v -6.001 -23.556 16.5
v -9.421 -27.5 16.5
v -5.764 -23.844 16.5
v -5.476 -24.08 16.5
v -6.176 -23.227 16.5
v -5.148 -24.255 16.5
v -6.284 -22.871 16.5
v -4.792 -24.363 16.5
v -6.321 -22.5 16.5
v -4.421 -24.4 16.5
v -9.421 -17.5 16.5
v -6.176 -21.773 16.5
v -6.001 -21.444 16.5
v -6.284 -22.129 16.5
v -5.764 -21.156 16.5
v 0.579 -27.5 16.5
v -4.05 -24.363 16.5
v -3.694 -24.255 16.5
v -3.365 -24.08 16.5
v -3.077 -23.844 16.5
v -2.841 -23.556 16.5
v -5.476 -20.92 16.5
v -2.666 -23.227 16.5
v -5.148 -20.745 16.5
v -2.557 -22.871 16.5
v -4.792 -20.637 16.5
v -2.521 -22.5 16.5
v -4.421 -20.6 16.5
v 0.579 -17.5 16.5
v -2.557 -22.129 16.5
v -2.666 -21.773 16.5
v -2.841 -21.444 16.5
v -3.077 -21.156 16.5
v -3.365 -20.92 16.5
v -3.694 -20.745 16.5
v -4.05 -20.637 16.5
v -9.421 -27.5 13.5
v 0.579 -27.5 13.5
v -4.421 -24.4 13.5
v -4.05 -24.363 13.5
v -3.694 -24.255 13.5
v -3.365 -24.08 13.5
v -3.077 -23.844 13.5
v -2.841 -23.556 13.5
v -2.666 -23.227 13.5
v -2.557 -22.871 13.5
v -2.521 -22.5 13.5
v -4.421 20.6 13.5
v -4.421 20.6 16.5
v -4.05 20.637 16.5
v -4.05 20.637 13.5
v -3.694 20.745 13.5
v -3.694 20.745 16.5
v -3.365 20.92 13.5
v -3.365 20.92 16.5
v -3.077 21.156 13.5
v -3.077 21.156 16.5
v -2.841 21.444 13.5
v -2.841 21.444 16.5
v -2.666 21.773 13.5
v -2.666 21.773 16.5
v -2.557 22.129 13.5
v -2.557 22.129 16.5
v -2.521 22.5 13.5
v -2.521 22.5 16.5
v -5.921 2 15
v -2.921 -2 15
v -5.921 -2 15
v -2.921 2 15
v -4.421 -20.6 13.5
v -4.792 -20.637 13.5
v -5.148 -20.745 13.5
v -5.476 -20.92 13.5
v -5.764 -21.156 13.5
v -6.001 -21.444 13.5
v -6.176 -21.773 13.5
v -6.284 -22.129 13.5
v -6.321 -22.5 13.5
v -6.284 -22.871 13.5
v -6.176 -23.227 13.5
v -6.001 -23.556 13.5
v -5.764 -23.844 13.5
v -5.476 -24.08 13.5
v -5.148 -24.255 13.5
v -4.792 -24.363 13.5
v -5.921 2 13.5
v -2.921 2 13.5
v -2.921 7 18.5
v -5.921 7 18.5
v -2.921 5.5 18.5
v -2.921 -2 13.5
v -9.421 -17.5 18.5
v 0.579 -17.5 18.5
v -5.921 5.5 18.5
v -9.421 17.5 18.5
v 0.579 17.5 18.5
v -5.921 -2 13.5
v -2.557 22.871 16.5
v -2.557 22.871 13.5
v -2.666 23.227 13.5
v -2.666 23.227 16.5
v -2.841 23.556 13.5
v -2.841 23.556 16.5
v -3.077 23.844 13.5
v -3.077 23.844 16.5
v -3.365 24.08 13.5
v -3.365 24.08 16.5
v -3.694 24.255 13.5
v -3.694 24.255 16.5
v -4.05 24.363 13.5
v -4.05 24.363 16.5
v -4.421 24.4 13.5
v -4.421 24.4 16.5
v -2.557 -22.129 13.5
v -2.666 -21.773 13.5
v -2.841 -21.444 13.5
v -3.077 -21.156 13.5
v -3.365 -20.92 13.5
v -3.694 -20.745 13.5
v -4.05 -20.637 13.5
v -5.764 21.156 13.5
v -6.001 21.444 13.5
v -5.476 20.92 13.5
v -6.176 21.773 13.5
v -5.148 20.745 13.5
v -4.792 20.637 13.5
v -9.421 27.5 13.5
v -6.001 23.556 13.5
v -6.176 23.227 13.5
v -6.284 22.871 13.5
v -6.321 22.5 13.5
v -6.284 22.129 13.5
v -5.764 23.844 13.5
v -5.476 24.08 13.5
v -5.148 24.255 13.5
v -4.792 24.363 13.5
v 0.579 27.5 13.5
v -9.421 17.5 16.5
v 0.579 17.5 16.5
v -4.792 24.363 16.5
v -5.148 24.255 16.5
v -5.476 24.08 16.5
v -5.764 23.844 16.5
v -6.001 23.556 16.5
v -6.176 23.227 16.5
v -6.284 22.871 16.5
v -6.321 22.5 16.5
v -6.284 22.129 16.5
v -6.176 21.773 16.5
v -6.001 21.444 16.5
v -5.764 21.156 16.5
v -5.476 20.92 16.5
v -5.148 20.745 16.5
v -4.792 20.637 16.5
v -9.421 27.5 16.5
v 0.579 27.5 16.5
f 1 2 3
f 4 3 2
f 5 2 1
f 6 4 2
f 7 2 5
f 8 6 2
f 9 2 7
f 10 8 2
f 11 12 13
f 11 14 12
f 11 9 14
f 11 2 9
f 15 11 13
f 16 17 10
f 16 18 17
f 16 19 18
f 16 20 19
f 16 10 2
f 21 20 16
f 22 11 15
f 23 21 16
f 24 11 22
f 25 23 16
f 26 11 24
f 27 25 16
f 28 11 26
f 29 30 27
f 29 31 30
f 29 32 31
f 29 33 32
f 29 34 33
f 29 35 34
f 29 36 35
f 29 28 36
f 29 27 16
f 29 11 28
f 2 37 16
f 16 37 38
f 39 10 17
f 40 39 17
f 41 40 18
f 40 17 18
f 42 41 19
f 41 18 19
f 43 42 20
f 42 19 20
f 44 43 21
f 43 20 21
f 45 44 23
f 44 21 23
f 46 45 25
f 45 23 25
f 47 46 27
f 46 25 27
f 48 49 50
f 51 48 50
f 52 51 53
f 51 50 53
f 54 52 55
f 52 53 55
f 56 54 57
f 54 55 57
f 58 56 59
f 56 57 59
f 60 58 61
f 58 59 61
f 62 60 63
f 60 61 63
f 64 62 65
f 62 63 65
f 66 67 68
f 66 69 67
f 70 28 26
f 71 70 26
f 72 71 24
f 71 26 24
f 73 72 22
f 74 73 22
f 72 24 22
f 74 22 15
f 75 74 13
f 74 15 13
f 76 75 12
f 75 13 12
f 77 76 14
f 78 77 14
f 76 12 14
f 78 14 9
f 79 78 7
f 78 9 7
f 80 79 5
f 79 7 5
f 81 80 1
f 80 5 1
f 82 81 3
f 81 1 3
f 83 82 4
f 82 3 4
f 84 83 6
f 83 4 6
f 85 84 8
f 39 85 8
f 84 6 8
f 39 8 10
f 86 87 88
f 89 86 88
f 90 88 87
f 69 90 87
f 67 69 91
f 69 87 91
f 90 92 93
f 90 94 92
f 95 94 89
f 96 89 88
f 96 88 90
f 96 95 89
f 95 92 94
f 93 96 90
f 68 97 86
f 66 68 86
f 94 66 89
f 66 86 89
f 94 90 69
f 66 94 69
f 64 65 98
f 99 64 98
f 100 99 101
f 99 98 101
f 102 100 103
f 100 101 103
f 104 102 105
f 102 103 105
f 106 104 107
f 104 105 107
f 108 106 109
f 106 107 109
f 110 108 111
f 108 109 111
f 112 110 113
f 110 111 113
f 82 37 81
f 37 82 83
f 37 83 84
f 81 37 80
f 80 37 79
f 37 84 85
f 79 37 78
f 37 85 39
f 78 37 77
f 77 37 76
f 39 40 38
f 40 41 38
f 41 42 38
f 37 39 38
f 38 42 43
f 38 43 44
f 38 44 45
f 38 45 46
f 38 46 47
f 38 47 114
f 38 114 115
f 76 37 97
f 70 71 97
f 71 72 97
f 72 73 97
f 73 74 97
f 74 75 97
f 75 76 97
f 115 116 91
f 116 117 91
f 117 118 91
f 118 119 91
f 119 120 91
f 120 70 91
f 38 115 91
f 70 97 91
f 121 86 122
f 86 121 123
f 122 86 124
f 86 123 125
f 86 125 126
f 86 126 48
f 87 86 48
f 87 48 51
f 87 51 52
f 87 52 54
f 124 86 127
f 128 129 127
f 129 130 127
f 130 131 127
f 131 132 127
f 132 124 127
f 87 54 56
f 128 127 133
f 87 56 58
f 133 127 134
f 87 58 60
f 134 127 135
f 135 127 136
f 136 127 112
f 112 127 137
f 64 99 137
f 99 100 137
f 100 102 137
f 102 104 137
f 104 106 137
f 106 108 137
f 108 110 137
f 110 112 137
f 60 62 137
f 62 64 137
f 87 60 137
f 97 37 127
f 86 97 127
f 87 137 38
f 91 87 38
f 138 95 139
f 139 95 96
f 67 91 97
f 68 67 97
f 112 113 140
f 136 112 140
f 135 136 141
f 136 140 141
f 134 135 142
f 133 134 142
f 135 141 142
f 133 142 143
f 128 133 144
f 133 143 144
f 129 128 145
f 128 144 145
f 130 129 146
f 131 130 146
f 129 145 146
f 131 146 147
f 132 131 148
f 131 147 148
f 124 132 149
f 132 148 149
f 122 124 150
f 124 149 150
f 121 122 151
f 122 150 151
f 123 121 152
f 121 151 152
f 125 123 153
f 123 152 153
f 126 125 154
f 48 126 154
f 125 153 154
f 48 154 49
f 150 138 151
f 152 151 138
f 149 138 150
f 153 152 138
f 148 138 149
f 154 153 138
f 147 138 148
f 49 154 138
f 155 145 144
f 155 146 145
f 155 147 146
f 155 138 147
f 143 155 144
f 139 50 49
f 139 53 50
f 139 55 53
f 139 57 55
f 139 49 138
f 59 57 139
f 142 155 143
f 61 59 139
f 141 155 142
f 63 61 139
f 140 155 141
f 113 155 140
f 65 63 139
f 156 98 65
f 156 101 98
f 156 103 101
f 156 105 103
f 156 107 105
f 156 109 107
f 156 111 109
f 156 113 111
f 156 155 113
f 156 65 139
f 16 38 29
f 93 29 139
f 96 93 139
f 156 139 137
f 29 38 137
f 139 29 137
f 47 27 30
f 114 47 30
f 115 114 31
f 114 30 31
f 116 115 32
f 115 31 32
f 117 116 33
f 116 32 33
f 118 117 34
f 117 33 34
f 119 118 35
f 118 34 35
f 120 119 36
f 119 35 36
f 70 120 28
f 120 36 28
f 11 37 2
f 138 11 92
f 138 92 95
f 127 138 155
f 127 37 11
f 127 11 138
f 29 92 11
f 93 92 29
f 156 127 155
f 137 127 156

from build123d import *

# Parameters (mm, degrees)
SKETCH1_W           = 10
SKETCH1_H           = 55
SKETCH1_W_2         = 4.5
SKETCH1_H_2         = 4
SKETCH1_H_3         = 2
BOSS_EXTRUDE2_DEPTH = 5
SKETCH2_W           = 5
SKETCH2_H           = 10
SKETCH2_W_2         = 10
CUT_EXTRUDE1_DEPTH  = 2
CUT_EXTRUDE2_DEPTH  = 30.223335826
SKETCH4_W           = 3
SKETCH4_H           = 2
CUT_EXTRUDE3_DEPTH  = 1.5
CUT_EXTRUDE4_DEPTH  = 3


with BuildPart() as part:
    # Sketch1 → Boss-Extrude2 (new body)
    # profile 1 of 3: a face of its own
    with BuildSketch(Plane.XY.offset(13.5)):
        with Locations((-4.4209, 0)):
            Rectangle(SKETCH1_W, SKETCH1_H)
        with Locations((-4.4209, 0)):
            Rectangle(SKETCH1_W_2, SKETCH1_H_2, mode=Mode.SUBTRACT)
    # profile 2 of 3: a face of its own
    with BuildSketch(Plane.XY.offset(13.5)):
        with Locations((-4.4209, -1)):
            Rectangle(SKETCH1_W_2, SKETCH1_H_3)
    # profile 3 of 3: a face of its own
    with BuildSketch(Plane.XY.offset(13.5)):
        with Locations((-4.4209, 1)):
            Rectangle(SKETCH1_W_2, SKETCH1_H_3)
    extrude(amount=BOSS_EXTRUDE2_DEPTH)

    # Sketch2 → Cut-Extrude1 (cut)
    with BuildSketch(Plane.XY.offset(18.5)):
        with Locations((-6.9209, 22.5)):
            Rectangle(SKETCH2_W, SKETCH2_H)
        with Locations((-1.9209, 22.5)):
            Rectangle(SKETCH2_W, SKETCH2_H)
        with Locations((-4.4209, -22.5)):
            Rectangle(SKETCH2_W_2, SKETCH2_H)
    extrude(amount=-CUT_EXTRUDE1_DEPTH, mode=Mode.SUBTRACT)

    # Sketch3 → Cut-Extrude2 (cut, through all)
    with BuildSketch(Plane.XY.offset(16.5)):
        with BuildLine():
            ThreePointArc((-2.5209, 22.5), (-3.077397116, 23.843502884), (-4.4209, 24.4))
            Line((-4.4209, 24.4), (-4.4209, 20.6))
            ThreePointArc((-4.4209, 20.6), (-3.077397116, 21.156497116), (-2.5209, 22.5))
        make_face()
        with BuildLine():
            Line((-4.4209, 20.6), (-4.4209, 24.4))
            ThreePointArc((-4.4209, 24.4), (-6.3209, 22.5), (-4.4209, 20.6))
        make_face()
        with BuildLine():
            ThreePointArc((-2.5209, -22.5), (-3.077397116, -21.156497116), (-4.4209, -20.6))
            Line((-4.4209, -20.6), (-4.4209, -24.4))
            ThreePointArc((-4.4209, -24.4), (-3.077397116, -23.843502884), (-2.5209, -22.5))
        make_face()
        with BuildLine():
            Line((-4.4209, -24.4), (-4.4209, -20.6))
            ThreePointArc((-4.4209, -20.6), (-6.3209, -22.5), (-4.4209, -24.4))
        make_face()
    extrude(amount=-CUT_EXTRUDE2_DEPTH, mode=Mode.SUBTRACT)

    # Sketch4 → Cut-Extrude3 (cut)
    with BuildSketch(Plane(origin=(0, 0, 13.5), x_dir=(-1, 0, 0), z_dir=(0, 0, -1))):
        with Locations((4.4209, -1)):
            Rectangle(SKETCH4_W, SKETCH4_H)
        with Locations((4.4209, 1)):
            Rectangle(SKETCH4_W, SKETCH4_H)
    extrude(amount=-CUT_EXTRUDE3_DEPTH, mode=Mode.SUBTRACT)

    # Sketch5 → Cut-Extrude4 (cut)
    with BuildSketch(Plane.ZY.offset(2.9209)):
        Polygon((18.5, 7), (18.5, 5.5), (15, 2), (13.5, 2), align=None)
    extrude(amount=CUT_EXTRUDE4_DEPTH, mode=Mode.SUBTRACT)


solid = part.part
